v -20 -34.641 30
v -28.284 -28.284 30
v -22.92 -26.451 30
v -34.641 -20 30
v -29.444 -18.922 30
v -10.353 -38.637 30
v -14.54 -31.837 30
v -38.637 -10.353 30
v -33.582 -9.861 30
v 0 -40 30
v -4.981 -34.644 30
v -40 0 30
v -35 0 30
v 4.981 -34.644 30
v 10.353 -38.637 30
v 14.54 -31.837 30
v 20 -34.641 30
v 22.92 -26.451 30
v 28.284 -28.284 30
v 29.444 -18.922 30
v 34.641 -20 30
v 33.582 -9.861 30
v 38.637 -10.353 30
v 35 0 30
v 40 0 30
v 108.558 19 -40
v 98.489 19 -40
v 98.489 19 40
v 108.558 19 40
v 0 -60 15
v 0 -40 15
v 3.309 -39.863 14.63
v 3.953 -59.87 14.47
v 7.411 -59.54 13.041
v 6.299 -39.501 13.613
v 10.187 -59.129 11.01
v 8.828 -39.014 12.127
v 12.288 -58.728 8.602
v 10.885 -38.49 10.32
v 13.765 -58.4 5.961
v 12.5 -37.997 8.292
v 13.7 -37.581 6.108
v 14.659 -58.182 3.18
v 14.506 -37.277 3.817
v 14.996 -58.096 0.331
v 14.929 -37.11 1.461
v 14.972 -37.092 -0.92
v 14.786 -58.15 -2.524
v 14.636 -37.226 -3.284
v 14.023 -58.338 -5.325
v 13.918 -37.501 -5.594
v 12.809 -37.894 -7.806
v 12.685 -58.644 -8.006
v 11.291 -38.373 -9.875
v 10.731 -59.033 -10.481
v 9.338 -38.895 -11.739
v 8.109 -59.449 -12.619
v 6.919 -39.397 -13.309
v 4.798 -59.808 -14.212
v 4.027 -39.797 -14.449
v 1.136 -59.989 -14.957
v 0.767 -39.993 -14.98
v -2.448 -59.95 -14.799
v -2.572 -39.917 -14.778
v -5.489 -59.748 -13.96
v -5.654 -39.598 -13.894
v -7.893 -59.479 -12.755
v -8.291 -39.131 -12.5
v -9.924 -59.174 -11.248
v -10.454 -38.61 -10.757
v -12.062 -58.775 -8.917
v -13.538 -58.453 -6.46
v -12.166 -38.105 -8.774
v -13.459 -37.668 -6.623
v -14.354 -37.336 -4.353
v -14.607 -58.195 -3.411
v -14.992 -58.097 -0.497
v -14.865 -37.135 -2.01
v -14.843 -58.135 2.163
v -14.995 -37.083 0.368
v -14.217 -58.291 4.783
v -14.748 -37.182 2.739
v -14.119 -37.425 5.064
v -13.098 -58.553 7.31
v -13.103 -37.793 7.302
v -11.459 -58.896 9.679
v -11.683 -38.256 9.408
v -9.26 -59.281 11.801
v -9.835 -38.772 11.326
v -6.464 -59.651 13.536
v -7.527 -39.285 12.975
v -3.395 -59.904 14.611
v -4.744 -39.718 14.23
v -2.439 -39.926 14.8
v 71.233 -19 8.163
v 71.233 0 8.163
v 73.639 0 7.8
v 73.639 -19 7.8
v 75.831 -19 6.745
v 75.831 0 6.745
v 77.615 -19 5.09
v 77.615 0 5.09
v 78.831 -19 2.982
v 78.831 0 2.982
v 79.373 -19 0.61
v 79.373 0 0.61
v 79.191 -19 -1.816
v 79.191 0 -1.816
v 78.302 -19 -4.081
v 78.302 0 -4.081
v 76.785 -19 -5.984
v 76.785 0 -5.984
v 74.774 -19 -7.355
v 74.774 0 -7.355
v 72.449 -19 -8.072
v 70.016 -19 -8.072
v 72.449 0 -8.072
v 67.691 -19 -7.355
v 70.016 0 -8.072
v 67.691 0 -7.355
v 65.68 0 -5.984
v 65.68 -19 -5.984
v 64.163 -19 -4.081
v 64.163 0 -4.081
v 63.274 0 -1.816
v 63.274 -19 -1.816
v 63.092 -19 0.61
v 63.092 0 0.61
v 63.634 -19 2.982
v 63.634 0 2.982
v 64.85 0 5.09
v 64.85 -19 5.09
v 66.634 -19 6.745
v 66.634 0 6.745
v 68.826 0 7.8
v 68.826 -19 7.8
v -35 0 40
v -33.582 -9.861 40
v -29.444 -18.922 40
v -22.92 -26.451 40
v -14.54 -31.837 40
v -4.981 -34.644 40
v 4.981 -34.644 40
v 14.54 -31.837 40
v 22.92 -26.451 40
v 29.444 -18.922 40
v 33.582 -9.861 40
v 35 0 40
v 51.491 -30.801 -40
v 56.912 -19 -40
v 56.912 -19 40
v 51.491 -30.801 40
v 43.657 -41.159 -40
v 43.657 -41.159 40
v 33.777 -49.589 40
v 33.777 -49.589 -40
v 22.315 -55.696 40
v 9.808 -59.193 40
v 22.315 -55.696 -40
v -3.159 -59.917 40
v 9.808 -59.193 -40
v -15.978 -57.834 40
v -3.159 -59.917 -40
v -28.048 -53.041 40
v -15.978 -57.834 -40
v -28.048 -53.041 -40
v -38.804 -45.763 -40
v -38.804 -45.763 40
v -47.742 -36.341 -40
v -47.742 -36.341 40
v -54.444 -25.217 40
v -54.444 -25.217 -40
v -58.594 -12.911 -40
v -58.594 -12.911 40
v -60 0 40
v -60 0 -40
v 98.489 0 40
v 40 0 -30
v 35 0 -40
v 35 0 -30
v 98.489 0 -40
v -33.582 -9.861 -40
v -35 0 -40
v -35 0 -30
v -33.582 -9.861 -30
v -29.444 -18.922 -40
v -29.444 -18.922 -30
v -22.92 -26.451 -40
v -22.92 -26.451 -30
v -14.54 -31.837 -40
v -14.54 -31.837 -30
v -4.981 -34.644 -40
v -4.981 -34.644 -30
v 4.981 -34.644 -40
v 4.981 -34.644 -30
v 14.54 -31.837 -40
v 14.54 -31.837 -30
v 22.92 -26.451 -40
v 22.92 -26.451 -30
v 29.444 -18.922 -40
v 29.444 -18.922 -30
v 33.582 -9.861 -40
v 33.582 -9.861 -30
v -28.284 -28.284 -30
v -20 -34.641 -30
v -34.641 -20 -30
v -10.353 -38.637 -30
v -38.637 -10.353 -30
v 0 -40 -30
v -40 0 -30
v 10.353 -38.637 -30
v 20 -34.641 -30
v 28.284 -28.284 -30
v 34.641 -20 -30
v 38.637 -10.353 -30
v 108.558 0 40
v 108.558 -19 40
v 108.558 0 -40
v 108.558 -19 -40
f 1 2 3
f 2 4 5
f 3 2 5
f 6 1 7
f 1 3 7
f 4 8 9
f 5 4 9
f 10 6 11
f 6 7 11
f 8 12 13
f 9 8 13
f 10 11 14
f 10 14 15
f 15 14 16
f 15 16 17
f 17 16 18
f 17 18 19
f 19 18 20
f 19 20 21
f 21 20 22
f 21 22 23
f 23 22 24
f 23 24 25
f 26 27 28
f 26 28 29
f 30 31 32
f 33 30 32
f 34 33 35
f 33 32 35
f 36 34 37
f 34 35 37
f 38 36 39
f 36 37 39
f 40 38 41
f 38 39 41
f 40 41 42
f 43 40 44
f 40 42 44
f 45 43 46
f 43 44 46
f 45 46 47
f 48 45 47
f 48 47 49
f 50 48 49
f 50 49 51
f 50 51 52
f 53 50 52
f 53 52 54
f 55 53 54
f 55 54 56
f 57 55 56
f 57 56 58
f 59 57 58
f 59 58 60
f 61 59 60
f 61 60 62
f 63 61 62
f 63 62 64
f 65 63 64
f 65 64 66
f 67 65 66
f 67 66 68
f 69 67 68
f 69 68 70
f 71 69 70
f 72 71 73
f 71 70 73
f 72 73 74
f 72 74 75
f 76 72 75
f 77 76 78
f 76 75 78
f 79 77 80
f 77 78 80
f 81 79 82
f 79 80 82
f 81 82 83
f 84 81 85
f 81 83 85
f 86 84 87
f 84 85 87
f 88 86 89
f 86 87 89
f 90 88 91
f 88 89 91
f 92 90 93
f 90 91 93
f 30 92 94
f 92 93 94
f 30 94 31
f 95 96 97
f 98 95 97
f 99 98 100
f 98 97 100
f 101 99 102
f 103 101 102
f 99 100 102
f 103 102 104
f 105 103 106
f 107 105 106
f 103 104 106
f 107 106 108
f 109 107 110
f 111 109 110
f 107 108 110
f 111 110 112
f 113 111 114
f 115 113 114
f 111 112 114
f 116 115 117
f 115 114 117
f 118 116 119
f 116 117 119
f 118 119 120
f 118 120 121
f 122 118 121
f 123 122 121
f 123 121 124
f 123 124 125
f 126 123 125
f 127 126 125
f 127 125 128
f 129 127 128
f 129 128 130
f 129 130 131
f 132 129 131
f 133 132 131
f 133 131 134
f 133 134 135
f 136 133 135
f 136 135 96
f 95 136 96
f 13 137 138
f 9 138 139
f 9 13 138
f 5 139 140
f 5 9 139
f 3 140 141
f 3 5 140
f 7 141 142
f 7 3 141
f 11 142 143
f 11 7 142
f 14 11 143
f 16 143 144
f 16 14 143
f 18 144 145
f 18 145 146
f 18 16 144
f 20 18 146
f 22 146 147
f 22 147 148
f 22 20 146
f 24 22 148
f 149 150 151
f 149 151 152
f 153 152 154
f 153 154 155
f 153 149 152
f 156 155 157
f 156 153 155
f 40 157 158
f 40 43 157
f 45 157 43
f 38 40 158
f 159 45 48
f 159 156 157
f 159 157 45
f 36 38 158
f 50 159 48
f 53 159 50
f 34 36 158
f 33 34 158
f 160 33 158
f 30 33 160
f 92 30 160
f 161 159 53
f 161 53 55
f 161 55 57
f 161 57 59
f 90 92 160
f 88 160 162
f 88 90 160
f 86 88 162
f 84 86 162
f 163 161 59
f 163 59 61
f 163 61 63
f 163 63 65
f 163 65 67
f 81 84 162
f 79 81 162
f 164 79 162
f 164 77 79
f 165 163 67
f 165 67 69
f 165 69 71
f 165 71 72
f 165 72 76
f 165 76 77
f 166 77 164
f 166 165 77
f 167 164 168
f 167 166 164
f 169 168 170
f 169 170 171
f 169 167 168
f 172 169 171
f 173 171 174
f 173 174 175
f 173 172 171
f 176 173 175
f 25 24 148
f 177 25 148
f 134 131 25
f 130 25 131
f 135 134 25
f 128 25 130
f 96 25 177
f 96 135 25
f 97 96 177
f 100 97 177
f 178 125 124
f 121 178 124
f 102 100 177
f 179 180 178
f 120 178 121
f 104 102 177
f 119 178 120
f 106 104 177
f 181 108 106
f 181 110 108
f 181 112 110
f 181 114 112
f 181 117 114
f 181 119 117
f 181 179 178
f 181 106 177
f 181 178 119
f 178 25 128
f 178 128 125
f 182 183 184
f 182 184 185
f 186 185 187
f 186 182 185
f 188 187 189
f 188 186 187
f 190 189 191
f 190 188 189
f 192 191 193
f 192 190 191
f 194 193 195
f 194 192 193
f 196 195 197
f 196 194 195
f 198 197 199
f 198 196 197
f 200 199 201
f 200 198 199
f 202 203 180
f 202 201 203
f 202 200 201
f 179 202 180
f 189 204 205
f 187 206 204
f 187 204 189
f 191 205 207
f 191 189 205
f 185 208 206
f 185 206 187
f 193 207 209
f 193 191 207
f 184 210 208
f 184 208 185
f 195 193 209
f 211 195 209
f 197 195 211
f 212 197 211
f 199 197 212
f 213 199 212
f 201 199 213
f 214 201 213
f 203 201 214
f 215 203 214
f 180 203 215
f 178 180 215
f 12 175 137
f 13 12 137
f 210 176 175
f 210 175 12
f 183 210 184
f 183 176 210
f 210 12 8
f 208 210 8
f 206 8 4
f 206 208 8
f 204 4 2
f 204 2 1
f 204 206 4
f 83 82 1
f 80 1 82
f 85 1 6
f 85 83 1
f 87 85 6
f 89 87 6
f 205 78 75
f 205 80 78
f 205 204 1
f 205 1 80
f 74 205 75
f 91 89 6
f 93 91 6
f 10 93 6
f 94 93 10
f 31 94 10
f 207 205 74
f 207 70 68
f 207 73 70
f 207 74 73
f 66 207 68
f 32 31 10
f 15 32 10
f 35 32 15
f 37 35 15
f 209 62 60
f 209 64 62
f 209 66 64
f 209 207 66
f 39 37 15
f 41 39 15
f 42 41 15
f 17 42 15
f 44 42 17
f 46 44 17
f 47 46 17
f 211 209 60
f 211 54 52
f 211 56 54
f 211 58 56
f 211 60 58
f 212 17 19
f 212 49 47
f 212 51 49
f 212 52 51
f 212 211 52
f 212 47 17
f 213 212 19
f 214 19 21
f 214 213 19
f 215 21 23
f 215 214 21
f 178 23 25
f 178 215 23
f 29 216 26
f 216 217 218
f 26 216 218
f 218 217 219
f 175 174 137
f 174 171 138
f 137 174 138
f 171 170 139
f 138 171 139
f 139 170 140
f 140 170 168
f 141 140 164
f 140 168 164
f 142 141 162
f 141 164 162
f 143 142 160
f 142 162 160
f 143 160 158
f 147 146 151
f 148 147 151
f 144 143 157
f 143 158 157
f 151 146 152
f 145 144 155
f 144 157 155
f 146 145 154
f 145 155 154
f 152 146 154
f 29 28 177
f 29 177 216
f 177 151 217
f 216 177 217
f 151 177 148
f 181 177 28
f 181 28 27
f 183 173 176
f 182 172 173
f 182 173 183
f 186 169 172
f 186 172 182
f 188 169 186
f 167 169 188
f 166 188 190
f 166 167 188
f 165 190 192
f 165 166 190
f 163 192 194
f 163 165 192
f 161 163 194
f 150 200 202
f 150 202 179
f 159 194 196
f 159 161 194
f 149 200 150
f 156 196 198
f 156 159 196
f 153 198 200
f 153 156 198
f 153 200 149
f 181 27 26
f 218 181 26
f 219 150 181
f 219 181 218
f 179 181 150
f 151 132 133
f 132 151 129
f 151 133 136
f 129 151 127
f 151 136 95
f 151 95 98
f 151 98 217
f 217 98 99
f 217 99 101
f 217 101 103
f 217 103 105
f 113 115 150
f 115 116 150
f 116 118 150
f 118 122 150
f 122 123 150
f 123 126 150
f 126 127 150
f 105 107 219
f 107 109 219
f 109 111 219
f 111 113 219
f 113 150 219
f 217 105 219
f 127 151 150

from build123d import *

# Parameters (mm, degrees)
EXTRUDE_1_DEPTH          = 40
EXTRUDE_1_DEPTH_BACK     = 40
CUT_EXTRUDE_1_DEPTH      = 30
CUT_EXTRUDE_1_DEPTH_BACK = 30
SKETCH_2_R               = 40
SKETCH_3_R               = 15
CUT_EXTRUDE_2_DEPTH      = 75
SKETCH_4_W               = 67.943944805
SKETCH_4_H               = 80
EXTRUDE_2_DEPTH          = 19
SKETCH_5_W               = 10.069063792
SKETCH_5_H               = 80
EXTRUDE_3_DEPTH          = 19
SKETCH_6_R               = 8.162997033
CUT_EXTRUDE_3_DEPTH      = 34


with BuildPart() as part:
    # 草图1 → 凸台-拉伸1 (new, two sides: drawn at the far end of the back side and taken through both)
    with BuildSketch(Plane.XY.offset(-EXTRUDE_1_DEPTH_BACK)):
        with BuildLine():
            Line((-60, 0), (-35, 0))
            ThreePointArc((-35, 0), (0, -35), (35, 0))
            Line((35, 0), (60, 0))
            ThreePointArc((60, 0), (0, -60), (-60, 0))
        make_face()
    extrude(amount=EXTRUDE_1_DEPTH + EXTRUDE_1_DEPTH_BACK)

    # 草图2 → 切除-拉伸1 (cut, two sides: drawn at the far end of the back side and taken through both)
    with BuildSketch(Plane.XY.offset(-CUT_EXTRUDE_1_DEPTH_BACK)):
        Circle(SKETCH_2_R)
    extrude(amount=CUT_EXTRUDE_1_DEPTH + CUT_EXTRUDE_1_DEPTH_BACK, mode=Mode.SUBTRACT)

    # 草图3 → 切除-拉伸2 (cut)
    with BuildSketch(Plane(origin=(0, 0, 0), x_dir=(1, 0, 0), z_dir=(0, 1, 0))):
        Circle(SKETCH_3_R)
    extrude(amount=-CUT_EXTRUDE_2_DEPTH, mode=Mode.SUBTRACT)

    # 草图4 → 凸台-拉伸2 (add)
    with BuildSketch(Plane(origin=(0, 0, 0), x_dir=(1, 0, 0), z_dir=(0, 1, 0))):
        with Locations((74.586023034, 0)):
            Rectangle(SKETCH_4_W, SKETCH_4_H)
    extrude(amount=-EXTRUDE_2_DEPTH)

    # 草图5 → 凸台-拉伸3 (add)
    with BuildSketch(Plane(origin=(0, 0, 0), x_dir=(1, 0, 0), z_dir=(0, 1, 0))):
        with Locations((103.52346354, 0)):
            Rectangle(SKETCH_5_W, SKETCH_5_H)
    extrude(amount=EXTRUDE_3_DEPTH)

    # 草图6 → 切除-拉伸3 (cut)
    with BuildSketch(Plane(origin=(0, 0, 0), x_dir=(1, 0, 0), z_dir=(0, 1, 0))):
        with Locations((71.232555132, 0)):
            Circle(SKETCH_6_R)
    extrude(amount=-CUT_EXTRUDE_3_DEPTH, mode=Mode.SUBTRACT)


solid = part.part
